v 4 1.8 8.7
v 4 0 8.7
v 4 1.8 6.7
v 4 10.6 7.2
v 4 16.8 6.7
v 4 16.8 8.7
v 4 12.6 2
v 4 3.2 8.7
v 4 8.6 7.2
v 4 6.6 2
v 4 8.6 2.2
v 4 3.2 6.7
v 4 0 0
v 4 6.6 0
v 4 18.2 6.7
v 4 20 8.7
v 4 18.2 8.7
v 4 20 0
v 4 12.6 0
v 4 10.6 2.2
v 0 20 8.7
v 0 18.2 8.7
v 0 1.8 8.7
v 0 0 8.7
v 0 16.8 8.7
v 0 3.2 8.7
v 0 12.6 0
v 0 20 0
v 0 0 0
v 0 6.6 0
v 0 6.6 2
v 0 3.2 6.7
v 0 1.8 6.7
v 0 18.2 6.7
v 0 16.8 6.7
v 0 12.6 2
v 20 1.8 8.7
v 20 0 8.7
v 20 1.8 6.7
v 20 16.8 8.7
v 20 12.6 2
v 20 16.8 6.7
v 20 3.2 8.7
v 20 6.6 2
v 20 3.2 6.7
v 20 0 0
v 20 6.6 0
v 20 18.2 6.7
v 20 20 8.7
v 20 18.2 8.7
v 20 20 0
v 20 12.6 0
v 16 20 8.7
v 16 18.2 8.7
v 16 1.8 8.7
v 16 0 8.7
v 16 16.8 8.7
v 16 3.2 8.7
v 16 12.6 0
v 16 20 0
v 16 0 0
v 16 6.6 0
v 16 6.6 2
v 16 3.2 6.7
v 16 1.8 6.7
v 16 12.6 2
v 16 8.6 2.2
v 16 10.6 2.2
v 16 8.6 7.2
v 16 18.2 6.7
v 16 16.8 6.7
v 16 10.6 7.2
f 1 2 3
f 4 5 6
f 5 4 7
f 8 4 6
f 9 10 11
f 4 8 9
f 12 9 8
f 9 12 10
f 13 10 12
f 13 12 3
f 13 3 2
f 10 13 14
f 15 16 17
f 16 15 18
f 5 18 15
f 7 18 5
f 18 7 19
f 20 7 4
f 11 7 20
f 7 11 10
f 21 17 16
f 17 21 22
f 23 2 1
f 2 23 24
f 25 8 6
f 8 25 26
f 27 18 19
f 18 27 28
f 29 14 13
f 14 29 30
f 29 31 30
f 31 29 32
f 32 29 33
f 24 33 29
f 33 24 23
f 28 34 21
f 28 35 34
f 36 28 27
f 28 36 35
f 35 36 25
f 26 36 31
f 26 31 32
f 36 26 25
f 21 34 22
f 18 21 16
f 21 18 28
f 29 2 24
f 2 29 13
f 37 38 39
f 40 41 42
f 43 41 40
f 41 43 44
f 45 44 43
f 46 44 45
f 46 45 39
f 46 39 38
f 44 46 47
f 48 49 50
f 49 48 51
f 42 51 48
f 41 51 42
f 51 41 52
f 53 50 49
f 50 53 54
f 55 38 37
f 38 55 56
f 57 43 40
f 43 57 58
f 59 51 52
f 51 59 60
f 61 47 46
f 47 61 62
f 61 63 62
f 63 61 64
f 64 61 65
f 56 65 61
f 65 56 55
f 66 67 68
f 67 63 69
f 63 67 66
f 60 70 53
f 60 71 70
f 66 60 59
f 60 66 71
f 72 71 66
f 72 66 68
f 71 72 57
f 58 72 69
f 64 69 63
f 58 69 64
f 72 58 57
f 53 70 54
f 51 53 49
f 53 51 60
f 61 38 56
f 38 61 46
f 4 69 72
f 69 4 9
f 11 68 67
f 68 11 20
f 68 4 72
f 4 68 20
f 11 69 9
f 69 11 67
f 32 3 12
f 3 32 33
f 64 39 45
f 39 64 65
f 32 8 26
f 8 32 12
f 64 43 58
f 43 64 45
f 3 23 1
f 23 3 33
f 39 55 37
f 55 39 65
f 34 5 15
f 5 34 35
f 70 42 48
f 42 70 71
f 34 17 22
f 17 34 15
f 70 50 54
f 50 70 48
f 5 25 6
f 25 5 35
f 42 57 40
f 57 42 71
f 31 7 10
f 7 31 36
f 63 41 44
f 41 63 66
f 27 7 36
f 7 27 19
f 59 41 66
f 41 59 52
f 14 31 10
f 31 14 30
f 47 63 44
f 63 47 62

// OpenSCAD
difference(){
    union() {
        cube([4, 20, 8.7]);
        translate([11+5,0,0])cube([4, 20, 8.7]);
        translate([0,1.8+(16-1-1.4)/2,2.2])cube([18,2,5]);
    }
    #translate([-1,1.8,6.7])cube([40,1.4,10]);
    #translate([-1,2+16-1.2,6.7])cube([40,1.4,10]);
    #translate([0,1.8+(16-1-1.4)/2-2,-3])cube([22,6,5]);
}
